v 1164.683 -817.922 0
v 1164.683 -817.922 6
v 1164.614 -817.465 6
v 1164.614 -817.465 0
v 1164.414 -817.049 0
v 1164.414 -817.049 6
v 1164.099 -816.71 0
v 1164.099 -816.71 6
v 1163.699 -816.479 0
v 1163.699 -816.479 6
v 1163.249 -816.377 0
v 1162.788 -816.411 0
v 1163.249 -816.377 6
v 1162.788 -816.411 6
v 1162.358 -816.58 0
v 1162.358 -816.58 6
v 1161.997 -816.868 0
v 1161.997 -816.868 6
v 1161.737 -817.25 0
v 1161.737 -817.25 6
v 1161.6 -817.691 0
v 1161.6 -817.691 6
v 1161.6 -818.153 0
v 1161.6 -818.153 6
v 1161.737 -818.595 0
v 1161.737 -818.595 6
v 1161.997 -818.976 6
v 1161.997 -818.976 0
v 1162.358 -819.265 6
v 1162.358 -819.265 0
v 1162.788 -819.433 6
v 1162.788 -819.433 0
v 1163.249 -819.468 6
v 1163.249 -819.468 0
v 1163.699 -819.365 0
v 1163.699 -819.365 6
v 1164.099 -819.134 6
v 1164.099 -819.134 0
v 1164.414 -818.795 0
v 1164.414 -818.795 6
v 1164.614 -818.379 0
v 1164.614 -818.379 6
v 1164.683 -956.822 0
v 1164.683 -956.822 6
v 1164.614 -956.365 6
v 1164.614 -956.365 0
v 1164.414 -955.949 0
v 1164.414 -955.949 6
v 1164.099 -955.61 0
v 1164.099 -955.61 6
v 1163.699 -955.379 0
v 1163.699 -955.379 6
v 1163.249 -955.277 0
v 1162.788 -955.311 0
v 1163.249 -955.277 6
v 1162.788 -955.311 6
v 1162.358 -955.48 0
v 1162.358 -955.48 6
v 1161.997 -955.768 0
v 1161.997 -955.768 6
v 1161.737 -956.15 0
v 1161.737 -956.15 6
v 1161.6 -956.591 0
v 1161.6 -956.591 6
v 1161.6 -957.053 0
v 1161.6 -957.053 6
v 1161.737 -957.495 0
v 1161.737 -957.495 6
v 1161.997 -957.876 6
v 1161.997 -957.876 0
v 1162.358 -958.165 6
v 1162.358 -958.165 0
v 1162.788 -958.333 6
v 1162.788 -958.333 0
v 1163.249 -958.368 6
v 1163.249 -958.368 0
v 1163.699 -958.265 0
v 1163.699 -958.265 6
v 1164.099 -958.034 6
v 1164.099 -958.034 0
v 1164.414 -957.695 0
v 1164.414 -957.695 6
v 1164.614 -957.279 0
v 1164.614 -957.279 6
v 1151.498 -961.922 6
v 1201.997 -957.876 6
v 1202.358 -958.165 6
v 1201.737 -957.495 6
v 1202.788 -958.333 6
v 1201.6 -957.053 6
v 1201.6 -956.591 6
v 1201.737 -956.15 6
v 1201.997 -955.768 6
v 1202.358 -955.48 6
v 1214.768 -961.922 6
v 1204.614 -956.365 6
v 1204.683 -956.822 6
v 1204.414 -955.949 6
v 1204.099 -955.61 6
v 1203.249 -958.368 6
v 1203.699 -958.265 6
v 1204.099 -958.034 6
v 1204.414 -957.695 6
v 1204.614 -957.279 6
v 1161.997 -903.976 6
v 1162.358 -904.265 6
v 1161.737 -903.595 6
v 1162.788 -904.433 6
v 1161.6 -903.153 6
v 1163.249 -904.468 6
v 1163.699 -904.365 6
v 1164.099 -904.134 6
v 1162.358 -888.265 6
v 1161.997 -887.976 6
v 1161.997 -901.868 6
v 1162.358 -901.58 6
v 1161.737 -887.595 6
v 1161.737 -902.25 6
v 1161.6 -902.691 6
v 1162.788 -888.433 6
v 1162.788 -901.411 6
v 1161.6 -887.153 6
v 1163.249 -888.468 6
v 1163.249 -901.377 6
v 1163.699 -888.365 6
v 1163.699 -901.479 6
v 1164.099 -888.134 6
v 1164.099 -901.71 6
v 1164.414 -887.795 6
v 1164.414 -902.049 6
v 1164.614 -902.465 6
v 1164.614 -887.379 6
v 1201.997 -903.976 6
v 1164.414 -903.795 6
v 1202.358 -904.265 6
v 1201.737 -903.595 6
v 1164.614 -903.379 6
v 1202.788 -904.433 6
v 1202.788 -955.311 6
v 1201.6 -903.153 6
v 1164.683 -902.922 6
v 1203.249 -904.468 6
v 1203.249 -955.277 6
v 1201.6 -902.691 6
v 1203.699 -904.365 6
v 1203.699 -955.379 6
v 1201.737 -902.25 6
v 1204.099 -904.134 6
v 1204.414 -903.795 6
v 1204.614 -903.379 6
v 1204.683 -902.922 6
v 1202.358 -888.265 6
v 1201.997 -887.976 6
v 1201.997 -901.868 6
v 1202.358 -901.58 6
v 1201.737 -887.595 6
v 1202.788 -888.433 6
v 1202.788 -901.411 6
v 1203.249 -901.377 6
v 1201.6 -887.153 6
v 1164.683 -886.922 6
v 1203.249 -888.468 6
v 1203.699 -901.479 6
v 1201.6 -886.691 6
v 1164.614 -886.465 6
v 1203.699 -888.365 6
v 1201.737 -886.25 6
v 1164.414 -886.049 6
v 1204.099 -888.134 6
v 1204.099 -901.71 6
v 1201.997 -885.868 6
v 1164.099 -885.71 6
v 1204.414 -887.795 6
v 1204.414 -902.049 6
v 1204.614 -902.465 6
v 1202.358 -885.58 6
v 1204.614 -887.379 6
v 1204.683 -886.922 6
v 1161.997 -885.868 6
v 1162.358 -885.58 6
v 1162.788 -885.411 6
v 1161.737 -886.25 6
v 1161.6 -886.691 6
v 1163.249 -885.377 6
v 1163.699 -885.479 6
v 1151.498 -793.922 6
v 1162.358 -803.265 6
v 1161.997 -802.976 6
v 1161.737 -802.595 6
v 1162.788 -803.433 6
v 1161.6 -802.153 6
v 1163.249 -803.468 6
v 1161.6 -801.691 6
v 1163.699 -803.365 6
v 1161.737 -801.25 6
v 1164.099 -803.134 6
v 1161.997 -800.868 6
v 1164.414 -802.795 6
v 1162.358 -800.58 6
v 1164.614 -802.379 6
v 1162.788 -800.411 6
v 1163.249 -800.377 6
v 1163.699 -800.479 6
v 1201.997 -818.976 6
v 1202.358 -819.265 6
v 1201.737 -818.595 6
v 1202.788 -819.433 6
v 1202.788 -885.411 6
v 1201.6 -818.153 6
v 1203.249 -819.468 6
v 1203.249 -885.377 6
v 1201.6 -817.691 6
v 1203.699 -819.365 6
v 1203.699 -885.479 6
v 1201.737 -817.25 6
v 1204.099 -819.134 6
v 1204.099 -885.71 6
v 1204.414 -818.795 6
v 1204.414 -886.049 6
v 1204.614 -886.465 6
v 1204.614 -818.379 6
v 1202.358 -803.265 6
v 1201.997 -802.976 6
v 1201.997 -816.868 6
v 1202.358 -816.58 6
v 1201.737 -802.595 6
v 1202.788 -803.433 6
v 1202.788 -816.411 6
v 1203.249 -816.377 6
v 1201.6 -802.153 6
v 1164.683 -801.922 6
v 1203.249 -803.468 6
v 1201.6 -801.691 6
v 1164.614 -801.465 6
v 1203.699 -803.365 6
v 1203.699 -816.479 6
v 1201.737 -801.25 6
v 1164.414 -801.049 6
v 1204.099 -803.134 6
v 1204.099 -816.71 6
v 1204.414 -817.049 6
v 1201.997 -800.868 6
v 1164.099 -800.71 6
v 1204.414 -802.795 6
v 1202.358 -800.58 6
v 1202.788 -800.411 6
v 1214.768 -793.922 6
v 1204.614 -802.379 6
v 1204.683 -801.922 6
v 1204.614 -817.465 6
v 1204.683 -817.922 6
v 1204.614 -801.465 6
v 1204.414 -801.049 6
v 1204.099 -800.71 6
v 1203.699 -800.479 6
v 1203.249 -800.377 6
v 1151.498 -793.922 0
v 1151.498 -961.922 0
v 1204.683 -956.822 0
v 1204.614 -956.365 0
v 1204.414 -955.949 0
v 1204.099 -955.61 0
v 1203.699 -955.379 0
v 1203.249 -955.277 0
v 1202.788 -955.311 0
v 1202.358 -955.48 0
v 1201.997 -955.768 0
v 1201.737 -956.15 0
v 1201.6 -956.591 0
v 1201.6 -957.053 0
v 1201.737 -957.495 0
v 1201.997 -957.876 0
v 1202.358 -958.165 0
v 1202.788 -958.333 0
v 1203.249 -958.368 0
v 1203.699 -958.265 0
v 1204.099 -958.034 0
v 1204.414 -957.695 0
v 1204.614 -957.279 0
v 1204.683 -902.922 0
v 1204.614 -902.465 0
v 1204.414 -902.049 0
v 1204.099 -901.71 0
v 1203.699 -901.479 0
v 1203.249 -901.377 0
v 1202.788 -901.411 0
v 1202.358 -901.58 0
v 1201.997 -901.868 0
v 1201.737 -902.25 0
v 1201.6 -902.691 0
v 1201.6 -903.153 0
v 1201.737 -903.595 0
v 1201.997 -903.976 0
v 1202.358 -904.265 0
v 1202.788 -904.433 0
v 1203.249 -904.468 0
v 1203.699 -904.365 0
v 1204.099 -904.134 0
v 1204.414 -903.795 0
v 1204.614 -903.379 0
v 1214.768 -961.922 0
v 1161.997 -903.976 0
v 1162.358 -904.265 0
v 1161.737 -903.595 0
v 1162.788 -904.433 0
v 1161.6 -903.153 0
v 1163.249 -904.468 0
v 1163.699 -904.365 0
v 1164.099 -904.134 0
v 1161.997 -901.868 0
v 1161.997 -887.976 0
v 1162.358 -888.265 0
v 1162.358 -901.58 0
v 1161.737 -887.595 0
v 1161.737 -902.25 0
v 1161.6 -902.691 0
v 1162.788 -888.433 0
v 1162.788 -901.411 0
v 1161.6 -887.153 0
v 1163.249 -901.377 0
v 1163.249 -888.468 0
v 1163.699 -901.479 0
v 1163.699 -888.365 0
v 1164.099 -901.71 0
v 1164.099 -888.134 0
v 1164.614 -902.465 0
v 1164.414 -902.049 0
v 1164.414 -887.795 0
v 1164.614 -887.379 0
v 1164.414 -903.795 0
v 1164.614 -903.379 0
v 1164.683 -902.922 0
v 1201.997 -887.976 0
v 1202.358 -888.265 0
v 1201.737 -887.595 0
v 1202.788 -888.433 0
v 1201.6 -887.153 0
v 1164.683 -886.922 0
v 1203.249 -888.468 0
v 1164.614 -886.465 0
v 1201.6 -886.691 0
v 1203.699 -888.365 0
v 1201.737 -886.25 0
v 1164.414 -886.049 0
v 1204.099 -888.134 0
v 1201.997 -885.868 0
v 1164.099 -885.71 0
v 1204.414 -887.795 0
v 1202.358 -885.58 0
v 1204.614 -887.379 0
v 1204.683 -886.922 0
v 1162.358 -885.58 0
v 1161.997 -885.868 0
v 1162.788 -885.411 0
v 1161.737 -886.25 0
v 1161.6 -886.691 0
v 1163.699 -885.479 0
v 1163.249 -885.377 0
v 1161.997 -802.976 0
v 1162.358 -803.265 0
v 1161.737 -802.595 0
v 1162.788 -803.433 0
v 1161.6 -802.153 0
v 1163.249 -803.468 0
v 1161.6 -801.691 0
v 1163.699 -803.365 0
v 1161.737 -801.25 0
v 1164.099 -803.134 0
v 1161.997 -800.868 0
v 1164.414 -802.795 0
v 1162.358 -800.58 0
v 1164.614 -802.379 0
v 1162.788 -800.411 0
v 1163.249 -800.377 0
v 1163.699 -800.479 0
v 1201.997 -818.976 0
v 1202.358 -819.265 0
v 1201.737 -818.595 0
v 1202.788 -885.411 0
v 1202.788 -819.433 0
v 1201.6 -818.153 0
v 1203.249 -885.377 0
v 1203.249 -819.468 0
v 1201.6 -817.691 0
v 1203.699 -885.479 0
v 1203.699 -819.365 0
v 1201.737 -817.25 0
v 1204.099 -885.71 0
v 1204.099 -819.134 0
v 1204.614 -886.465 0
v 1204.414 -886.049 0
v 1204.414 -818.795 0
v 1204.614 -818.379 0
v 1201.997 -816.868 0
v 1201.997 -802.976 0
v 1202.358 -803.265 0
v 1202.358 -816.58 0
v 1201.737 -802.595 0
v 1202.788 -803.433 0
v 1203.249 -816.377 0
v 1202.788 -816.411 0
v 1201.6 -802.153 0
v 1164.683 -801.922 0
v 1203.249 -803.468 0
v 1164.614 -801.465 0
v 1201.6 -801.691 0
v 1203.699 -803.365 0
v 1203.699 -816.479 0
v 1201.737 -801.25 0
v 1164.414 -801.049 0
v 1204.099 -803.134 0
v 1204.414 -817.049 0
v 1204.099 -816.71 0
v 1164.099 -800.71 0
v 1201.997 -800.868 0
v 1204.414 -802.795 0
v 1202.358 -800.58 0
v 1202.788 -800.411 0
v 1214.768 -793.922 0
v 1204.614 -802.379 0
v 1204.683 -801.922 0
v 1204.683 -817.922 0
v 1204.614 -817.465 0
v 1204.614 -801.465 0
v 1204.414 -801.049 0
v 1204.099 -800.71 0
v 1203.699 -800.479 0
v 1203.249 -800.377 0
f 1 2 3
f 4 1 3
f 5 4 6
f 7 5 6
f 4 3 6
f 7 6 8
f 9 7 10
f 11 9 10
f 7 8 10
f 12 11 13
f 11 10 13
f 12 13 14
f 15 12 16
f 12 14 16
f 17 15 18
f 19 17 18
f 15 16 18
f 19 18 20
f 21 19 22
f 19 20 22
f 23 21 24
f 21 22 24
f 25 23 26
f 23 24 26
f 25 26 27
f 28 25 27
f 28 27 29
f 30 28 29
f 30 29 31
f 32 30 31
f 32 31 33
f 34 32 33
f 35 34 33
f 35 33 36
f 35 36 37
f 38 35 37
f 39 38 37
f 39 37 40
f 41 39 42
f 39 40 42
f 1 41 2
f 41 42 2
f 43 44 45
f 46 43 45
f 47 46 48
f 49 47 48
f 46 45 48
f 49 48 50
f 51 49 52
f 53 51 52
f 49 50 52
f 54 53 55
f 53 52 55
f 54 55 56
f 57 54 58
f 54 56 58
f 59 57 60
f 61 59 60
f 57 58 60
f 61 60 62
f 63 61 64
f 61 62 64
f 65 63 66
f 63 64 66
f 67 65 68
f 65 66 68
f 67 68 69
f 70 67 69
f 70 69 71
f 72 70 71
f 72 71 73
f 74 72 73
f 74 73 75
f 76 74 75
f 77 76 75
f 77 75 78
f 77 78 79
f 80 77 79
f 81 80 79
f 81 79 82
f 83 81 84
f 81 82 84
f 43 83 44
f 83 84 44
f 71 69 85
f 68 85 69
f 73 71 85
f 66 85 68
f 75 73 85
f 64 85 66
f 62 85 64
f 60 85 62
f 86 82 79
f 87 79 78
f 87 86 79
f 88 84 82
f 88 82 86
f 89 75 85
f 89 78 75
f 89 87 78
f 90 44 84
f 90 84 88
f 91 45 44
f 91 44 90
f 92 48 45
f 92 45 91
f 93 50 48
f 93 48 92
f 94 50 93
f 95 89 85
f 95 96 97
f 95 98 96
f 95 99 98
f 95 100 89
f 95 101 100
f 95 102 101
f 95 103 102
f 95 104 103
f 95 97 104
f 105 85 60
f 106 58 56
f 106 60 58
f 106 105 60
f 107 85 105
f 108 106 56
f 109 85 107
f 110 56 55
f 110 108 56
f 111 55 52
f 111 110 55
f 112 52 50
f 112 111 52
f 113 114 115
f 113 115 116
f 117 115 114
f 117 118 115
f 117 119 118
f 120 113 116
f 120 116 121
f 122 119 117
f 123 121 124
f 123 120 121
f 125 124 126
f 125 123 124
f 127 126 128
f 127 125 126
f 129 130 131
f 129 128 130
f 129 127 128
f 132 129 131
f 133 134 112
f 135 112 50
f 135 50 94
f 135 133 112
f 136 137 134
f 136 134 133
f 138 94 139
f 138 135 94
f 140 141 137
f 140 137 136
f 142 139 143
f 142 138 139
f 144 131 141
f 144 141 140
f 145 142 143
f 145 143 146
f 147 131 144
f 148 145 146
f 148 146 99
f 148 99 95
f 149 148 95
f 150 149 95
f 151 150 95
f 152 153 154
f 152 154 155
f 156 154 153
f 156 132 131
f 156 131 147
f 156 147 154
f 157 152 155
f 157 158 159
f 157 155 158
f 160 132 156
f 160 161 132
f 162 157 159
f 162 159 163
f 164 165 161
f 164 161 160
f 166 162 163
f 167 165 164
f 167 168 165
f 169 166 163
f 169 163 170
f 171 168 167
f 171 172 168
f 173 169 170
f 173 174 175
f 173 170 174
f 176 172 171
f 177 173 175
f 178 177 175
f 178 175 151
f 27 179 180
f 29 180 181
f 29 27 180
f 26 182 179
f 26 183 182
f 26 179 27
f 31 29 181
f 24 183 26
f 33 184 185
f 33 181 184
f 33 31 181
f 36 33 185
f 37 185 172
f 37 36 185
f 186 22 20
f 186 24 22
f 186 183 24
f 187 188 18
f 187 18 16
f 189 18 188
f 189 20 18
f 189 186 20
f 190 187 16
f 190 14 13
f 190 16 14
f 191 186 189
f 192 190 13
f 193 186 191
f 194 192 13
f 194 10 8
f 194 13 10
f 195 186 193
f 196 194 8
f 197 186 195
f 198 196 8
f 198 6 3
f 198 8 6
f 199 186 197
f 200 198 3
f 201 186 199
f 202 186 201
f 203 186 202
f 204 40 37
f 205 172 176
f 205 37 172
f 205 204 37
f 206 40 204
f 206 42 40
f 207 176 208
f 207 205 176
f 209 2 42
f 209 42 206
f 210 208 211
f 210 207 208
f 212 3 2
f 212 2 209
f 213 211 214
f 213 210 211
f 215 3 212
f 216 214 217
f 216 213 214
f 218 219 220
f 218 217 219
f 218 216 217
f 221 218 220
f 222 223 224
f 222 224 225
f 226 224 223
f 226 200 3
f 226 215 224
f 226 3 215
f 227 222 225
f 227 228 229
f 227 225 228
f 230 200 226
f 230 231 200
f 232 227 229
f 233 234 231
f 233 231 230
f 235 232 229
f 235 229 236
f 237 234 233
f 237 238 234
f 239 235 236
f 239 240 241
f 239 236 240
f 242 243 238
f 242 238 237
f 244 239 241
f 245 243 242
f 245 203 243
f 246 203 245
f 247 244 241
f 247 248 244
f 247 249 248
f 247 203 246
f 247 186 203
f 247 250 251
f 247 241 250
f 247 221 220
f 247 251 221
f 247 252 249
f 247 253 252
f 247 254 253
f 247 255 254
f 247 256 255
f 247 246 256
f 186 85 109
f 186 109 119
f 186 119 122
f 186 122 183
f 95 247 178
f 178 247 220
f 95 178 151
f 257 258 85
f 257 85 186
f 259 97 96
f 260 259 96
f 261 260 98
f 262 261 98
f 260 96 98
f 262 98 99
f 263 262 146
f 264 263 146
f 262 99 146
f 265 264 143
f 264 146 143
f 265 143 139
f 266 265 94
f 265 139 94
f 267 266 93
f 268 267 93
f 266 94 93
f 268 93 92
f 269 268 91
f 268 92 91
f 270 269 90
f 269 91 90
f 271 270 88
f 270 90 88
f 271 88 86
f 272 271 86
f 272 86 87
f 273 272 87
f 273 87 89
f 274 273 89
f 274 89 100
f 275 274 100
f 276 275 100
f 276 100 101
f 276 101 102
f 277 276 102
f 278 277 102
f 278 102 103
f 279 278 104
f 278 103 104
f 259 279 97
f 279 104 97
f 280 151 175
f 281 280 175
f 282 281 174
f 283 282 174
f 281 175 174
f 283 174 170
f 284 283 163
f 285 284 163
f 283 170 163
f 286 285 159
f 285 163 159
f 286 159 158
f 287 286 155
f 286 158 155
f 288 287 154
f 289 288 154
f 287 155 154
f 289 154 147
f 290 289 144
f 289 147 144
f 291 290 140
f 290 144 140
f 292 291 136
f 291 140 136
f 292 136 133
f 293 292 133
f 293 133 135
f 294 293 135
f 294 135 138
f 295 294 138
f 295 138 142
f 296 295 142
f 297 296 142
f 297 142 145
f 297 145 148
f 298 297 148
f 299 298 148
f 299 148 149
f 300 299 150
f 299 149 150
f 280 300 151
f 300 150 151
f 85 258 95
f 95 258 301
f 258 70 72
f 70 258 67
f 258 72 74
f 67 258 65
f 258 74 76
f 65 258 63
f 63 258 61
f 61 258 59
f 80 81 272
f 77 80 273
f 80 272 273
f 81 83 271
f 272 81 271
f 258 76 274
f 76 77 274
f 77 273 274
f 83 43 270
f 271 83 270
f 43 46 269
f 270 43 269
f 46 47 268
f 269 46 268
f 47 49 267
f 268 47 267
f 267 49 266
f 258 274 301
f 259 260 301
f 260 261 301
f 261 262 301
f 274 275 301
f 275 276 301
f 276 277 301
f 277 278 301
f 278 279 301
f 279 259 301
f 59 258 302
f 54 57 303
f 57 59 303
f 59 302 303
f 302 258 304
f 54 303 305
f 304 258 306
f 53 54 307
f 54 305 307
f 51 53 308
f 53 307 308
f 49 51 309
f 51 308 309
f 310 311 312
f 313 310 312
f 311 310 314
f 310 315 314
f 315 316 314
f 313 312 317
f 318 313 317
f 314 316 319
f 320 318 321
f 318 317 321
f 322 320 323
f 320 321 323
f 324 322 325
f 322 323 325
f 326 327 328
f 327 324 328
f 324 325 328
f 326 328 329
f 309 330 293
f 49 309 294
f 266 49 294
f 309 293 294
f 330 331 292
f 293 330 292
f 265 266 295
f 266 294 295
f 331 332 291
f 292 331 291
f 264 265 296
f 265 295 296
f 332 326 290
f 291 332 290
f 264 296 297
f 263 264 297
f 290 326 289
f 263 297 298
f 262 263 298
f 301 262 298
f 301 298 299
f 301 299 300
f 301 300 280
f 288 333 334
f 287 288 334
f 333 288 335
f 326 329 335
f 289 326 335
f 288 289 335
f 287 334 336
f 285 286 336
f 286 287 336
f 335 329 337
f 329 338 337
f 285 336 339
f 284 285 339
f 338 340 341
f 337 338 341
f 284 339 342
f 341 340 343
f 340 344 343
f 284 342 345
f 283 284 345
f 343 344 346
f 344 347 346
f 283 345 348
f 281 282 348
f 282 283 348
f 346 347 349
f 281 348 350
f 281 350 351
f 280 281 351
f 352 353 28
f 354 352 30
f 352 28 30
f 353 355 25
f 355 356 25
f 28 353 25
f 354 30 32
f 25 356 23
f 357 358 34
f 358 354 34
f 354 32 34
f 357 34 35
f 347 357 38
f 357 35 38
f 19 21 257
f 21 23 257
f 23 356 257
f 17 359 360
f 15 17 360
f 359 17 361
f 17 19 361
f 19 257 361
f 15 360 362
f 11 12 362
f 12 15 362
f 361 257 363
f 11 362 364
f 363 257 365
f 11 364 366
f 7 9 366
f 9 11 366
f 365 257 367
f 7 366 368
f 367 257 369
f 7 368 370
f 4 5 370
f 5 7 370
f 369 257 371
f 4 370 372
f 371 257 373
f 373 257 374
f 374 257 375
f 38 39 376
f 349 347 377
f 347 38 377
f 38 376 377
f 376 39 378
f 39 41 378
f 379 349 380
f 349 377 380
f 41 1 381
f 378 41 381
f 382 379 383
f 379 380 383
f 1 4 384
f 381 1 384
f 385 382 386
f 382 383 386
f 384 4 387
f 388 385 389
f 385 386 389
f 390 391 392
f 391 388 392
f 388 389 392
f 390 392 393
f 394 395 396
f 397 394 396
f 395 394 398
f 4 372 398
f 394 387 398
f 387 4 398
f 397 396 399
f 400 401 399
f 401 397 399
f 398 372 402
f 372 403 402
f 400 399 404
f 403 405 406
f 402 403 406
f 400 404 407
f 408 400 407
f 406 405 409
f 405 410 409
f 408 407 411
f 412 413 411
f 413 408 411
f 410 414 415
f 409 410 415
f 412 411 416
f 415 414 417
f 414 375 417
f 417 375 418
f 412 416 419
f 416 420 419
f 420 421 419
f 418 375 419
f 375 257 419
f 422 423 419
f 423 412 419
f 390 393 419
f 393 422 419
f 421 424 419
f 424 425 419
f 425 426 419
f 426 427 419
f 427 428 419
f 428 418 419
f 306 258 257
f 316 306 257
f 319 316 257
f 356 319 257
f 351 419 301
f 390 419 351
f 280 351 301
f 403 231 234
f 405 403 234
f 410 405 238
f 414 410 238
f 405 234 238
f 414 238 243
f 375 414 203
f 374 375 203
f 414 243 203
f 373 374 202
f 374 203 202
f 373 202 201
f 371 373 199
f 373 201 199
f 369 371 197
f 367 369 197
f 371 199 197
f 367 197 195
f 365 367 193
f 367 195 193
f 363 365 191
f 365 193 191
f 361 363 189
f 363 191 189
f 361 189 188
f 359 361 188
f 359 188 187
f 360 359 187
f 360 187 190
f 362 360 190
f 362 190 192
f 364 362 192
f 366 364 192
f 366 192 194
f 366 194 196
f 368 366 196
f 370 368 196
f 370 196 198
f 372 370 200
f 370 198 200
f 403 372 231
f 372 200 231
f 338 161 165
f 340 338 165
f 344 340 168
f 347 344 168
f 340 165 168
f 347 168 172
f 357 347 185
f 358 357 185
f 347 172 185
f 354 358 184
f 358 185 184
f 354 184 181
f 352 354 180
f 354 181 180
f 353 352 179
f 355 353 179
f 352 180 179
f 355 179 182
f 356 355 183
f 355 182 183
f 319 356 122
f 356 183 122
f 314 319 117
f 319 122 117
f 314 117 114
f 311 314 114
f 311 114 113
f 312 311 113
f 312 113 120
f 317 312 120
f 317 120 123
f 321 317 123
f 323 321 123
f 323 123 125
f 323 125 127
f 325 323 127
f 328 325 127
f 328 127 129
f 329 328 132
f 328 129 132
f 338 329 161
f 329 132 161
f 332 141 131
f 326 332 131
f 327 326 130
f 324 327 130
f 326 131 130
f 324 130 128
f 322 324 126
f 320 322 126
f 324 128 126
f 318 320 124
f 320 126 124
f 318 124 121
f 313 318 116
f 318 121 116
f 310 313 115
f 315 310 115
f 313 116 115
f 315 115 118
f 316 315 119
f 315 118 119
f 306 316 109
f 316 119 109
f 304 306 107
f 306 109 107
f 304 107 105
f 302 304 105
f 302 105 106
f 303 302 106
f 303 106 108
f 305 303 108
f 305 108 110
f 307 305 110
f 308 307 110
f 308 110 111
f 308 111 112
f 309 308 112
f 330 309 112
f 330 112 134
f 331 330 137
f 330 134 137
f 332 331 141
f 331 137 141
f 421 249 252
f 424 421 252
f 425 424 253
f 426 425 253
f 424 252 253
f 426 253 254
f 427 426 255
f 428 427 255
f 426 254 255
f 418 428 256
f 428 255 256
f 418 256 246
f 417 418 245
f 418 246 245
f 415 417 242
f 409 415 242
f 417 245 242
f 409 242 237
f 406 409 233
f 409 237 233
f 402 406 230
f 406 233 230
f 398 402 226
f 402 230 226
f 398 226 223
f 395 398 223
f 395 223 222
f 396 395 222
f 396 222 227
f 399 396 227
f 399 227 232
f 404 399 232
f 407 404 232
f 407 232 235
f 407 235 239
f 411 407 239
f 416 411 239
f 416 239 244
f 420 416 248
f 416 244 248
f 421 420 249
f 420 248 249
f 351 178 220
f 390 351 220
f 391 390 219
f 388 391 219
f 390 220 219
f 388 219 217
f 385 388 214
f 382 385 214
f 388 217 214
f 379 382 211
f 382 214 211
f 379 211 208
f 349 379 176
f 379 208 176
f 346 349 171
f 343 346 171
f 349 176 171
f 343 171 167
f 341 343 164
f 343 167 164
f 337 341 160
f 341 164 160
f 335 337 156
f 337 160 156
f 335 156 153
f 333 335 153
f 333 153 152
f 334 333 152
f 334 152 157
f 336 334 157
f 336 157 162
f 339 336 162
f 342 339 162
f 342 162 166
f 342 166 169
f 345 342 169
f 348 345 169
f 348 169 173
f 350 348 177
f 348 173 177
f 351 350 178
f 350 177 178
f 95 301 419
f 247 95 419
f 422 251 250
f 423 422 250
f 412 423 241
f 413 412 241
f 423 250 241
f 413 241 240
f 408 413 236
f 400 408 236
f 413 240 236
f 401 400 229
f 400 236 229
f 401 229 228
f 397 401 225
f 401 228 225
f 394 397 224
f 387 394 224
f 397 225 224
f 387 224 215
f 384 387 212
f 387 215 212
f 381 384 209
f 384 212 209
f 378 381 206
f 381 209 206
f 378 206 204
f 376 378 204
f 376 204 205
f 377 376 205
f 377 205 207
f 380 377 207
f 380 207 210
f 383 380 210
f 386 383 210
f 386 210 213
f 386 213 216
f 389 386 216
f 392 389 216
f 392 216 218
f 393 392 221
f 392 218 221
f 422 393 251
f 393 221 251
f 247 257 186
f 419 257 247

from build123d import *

# Parameters (mm, degrees)
SZKIC1_W                    = 63.27
SZKIC1_H                    = 168
DODANIE_WYCI_GNI_CIE1_DEPTH = 6
SZKIC5_R                    = 1.55
WYTNIJ_WYCI_GNI_CIE1_DEPTH  = 6
SZYK_LINIOWY1_COUNT         = 2
SZYK_LINIOWY1_PITCH         = 16


with BuildPart() as part:
    # Szkic1 → Dodanie-wyciągnięcie1 (new body)
    with BuildSketch(Plane.XY):
        with Locations((1183.133039301, -877.922207314)):
            Rectangle(SZKIC1_W, SZKIC1_H)
    extrude(amount=DODANIE_WYCI_GNI_CIE1_DEPTH)

    # Szkic5 → Wytnij-wyciągnięcie1 (cut)
    with BuildSketch(Plane.XY.offset(6)):
        with Locations((1203.133039301, -956.822207314)):
            Circle(SZKIC5_R)
        with Locations((1163.133039301, -956.822207314)):
            Circle(SZKIC5_R)
        with Locations((1163.133039301, -886.922207314)):
            Circle(SZKIC5_R)
        with Locations((1203.133039301, -886.922207314)):
            Circle(SZKIC5_R)
        with Locations((1203.133039301, -801.922207314)):
            Circle(SZKIC5_R)
        with Locations((1163.133039301, -801.922207314)):
            Circle(SZKIC5_R)
    wytnij_wyci_gni_cie1 = extrude(amount=-WYTNIJ_WYCI_GNI_CIE1_DEPTH, mode=Mode.SUBTRACT)

    # Szyk liniowy1: Wytnij-wyciągnięcie1 ×2
    with Locations(*[(0, -i * SZYK_LINIOWY1_PITCH, 0) for i in range(1, SZYK_LINIOWY1_COUNT)]):
        add(wytnij_wyci_gni_cie1, mode=Mode.SUBTRACT)


solid = part.part
